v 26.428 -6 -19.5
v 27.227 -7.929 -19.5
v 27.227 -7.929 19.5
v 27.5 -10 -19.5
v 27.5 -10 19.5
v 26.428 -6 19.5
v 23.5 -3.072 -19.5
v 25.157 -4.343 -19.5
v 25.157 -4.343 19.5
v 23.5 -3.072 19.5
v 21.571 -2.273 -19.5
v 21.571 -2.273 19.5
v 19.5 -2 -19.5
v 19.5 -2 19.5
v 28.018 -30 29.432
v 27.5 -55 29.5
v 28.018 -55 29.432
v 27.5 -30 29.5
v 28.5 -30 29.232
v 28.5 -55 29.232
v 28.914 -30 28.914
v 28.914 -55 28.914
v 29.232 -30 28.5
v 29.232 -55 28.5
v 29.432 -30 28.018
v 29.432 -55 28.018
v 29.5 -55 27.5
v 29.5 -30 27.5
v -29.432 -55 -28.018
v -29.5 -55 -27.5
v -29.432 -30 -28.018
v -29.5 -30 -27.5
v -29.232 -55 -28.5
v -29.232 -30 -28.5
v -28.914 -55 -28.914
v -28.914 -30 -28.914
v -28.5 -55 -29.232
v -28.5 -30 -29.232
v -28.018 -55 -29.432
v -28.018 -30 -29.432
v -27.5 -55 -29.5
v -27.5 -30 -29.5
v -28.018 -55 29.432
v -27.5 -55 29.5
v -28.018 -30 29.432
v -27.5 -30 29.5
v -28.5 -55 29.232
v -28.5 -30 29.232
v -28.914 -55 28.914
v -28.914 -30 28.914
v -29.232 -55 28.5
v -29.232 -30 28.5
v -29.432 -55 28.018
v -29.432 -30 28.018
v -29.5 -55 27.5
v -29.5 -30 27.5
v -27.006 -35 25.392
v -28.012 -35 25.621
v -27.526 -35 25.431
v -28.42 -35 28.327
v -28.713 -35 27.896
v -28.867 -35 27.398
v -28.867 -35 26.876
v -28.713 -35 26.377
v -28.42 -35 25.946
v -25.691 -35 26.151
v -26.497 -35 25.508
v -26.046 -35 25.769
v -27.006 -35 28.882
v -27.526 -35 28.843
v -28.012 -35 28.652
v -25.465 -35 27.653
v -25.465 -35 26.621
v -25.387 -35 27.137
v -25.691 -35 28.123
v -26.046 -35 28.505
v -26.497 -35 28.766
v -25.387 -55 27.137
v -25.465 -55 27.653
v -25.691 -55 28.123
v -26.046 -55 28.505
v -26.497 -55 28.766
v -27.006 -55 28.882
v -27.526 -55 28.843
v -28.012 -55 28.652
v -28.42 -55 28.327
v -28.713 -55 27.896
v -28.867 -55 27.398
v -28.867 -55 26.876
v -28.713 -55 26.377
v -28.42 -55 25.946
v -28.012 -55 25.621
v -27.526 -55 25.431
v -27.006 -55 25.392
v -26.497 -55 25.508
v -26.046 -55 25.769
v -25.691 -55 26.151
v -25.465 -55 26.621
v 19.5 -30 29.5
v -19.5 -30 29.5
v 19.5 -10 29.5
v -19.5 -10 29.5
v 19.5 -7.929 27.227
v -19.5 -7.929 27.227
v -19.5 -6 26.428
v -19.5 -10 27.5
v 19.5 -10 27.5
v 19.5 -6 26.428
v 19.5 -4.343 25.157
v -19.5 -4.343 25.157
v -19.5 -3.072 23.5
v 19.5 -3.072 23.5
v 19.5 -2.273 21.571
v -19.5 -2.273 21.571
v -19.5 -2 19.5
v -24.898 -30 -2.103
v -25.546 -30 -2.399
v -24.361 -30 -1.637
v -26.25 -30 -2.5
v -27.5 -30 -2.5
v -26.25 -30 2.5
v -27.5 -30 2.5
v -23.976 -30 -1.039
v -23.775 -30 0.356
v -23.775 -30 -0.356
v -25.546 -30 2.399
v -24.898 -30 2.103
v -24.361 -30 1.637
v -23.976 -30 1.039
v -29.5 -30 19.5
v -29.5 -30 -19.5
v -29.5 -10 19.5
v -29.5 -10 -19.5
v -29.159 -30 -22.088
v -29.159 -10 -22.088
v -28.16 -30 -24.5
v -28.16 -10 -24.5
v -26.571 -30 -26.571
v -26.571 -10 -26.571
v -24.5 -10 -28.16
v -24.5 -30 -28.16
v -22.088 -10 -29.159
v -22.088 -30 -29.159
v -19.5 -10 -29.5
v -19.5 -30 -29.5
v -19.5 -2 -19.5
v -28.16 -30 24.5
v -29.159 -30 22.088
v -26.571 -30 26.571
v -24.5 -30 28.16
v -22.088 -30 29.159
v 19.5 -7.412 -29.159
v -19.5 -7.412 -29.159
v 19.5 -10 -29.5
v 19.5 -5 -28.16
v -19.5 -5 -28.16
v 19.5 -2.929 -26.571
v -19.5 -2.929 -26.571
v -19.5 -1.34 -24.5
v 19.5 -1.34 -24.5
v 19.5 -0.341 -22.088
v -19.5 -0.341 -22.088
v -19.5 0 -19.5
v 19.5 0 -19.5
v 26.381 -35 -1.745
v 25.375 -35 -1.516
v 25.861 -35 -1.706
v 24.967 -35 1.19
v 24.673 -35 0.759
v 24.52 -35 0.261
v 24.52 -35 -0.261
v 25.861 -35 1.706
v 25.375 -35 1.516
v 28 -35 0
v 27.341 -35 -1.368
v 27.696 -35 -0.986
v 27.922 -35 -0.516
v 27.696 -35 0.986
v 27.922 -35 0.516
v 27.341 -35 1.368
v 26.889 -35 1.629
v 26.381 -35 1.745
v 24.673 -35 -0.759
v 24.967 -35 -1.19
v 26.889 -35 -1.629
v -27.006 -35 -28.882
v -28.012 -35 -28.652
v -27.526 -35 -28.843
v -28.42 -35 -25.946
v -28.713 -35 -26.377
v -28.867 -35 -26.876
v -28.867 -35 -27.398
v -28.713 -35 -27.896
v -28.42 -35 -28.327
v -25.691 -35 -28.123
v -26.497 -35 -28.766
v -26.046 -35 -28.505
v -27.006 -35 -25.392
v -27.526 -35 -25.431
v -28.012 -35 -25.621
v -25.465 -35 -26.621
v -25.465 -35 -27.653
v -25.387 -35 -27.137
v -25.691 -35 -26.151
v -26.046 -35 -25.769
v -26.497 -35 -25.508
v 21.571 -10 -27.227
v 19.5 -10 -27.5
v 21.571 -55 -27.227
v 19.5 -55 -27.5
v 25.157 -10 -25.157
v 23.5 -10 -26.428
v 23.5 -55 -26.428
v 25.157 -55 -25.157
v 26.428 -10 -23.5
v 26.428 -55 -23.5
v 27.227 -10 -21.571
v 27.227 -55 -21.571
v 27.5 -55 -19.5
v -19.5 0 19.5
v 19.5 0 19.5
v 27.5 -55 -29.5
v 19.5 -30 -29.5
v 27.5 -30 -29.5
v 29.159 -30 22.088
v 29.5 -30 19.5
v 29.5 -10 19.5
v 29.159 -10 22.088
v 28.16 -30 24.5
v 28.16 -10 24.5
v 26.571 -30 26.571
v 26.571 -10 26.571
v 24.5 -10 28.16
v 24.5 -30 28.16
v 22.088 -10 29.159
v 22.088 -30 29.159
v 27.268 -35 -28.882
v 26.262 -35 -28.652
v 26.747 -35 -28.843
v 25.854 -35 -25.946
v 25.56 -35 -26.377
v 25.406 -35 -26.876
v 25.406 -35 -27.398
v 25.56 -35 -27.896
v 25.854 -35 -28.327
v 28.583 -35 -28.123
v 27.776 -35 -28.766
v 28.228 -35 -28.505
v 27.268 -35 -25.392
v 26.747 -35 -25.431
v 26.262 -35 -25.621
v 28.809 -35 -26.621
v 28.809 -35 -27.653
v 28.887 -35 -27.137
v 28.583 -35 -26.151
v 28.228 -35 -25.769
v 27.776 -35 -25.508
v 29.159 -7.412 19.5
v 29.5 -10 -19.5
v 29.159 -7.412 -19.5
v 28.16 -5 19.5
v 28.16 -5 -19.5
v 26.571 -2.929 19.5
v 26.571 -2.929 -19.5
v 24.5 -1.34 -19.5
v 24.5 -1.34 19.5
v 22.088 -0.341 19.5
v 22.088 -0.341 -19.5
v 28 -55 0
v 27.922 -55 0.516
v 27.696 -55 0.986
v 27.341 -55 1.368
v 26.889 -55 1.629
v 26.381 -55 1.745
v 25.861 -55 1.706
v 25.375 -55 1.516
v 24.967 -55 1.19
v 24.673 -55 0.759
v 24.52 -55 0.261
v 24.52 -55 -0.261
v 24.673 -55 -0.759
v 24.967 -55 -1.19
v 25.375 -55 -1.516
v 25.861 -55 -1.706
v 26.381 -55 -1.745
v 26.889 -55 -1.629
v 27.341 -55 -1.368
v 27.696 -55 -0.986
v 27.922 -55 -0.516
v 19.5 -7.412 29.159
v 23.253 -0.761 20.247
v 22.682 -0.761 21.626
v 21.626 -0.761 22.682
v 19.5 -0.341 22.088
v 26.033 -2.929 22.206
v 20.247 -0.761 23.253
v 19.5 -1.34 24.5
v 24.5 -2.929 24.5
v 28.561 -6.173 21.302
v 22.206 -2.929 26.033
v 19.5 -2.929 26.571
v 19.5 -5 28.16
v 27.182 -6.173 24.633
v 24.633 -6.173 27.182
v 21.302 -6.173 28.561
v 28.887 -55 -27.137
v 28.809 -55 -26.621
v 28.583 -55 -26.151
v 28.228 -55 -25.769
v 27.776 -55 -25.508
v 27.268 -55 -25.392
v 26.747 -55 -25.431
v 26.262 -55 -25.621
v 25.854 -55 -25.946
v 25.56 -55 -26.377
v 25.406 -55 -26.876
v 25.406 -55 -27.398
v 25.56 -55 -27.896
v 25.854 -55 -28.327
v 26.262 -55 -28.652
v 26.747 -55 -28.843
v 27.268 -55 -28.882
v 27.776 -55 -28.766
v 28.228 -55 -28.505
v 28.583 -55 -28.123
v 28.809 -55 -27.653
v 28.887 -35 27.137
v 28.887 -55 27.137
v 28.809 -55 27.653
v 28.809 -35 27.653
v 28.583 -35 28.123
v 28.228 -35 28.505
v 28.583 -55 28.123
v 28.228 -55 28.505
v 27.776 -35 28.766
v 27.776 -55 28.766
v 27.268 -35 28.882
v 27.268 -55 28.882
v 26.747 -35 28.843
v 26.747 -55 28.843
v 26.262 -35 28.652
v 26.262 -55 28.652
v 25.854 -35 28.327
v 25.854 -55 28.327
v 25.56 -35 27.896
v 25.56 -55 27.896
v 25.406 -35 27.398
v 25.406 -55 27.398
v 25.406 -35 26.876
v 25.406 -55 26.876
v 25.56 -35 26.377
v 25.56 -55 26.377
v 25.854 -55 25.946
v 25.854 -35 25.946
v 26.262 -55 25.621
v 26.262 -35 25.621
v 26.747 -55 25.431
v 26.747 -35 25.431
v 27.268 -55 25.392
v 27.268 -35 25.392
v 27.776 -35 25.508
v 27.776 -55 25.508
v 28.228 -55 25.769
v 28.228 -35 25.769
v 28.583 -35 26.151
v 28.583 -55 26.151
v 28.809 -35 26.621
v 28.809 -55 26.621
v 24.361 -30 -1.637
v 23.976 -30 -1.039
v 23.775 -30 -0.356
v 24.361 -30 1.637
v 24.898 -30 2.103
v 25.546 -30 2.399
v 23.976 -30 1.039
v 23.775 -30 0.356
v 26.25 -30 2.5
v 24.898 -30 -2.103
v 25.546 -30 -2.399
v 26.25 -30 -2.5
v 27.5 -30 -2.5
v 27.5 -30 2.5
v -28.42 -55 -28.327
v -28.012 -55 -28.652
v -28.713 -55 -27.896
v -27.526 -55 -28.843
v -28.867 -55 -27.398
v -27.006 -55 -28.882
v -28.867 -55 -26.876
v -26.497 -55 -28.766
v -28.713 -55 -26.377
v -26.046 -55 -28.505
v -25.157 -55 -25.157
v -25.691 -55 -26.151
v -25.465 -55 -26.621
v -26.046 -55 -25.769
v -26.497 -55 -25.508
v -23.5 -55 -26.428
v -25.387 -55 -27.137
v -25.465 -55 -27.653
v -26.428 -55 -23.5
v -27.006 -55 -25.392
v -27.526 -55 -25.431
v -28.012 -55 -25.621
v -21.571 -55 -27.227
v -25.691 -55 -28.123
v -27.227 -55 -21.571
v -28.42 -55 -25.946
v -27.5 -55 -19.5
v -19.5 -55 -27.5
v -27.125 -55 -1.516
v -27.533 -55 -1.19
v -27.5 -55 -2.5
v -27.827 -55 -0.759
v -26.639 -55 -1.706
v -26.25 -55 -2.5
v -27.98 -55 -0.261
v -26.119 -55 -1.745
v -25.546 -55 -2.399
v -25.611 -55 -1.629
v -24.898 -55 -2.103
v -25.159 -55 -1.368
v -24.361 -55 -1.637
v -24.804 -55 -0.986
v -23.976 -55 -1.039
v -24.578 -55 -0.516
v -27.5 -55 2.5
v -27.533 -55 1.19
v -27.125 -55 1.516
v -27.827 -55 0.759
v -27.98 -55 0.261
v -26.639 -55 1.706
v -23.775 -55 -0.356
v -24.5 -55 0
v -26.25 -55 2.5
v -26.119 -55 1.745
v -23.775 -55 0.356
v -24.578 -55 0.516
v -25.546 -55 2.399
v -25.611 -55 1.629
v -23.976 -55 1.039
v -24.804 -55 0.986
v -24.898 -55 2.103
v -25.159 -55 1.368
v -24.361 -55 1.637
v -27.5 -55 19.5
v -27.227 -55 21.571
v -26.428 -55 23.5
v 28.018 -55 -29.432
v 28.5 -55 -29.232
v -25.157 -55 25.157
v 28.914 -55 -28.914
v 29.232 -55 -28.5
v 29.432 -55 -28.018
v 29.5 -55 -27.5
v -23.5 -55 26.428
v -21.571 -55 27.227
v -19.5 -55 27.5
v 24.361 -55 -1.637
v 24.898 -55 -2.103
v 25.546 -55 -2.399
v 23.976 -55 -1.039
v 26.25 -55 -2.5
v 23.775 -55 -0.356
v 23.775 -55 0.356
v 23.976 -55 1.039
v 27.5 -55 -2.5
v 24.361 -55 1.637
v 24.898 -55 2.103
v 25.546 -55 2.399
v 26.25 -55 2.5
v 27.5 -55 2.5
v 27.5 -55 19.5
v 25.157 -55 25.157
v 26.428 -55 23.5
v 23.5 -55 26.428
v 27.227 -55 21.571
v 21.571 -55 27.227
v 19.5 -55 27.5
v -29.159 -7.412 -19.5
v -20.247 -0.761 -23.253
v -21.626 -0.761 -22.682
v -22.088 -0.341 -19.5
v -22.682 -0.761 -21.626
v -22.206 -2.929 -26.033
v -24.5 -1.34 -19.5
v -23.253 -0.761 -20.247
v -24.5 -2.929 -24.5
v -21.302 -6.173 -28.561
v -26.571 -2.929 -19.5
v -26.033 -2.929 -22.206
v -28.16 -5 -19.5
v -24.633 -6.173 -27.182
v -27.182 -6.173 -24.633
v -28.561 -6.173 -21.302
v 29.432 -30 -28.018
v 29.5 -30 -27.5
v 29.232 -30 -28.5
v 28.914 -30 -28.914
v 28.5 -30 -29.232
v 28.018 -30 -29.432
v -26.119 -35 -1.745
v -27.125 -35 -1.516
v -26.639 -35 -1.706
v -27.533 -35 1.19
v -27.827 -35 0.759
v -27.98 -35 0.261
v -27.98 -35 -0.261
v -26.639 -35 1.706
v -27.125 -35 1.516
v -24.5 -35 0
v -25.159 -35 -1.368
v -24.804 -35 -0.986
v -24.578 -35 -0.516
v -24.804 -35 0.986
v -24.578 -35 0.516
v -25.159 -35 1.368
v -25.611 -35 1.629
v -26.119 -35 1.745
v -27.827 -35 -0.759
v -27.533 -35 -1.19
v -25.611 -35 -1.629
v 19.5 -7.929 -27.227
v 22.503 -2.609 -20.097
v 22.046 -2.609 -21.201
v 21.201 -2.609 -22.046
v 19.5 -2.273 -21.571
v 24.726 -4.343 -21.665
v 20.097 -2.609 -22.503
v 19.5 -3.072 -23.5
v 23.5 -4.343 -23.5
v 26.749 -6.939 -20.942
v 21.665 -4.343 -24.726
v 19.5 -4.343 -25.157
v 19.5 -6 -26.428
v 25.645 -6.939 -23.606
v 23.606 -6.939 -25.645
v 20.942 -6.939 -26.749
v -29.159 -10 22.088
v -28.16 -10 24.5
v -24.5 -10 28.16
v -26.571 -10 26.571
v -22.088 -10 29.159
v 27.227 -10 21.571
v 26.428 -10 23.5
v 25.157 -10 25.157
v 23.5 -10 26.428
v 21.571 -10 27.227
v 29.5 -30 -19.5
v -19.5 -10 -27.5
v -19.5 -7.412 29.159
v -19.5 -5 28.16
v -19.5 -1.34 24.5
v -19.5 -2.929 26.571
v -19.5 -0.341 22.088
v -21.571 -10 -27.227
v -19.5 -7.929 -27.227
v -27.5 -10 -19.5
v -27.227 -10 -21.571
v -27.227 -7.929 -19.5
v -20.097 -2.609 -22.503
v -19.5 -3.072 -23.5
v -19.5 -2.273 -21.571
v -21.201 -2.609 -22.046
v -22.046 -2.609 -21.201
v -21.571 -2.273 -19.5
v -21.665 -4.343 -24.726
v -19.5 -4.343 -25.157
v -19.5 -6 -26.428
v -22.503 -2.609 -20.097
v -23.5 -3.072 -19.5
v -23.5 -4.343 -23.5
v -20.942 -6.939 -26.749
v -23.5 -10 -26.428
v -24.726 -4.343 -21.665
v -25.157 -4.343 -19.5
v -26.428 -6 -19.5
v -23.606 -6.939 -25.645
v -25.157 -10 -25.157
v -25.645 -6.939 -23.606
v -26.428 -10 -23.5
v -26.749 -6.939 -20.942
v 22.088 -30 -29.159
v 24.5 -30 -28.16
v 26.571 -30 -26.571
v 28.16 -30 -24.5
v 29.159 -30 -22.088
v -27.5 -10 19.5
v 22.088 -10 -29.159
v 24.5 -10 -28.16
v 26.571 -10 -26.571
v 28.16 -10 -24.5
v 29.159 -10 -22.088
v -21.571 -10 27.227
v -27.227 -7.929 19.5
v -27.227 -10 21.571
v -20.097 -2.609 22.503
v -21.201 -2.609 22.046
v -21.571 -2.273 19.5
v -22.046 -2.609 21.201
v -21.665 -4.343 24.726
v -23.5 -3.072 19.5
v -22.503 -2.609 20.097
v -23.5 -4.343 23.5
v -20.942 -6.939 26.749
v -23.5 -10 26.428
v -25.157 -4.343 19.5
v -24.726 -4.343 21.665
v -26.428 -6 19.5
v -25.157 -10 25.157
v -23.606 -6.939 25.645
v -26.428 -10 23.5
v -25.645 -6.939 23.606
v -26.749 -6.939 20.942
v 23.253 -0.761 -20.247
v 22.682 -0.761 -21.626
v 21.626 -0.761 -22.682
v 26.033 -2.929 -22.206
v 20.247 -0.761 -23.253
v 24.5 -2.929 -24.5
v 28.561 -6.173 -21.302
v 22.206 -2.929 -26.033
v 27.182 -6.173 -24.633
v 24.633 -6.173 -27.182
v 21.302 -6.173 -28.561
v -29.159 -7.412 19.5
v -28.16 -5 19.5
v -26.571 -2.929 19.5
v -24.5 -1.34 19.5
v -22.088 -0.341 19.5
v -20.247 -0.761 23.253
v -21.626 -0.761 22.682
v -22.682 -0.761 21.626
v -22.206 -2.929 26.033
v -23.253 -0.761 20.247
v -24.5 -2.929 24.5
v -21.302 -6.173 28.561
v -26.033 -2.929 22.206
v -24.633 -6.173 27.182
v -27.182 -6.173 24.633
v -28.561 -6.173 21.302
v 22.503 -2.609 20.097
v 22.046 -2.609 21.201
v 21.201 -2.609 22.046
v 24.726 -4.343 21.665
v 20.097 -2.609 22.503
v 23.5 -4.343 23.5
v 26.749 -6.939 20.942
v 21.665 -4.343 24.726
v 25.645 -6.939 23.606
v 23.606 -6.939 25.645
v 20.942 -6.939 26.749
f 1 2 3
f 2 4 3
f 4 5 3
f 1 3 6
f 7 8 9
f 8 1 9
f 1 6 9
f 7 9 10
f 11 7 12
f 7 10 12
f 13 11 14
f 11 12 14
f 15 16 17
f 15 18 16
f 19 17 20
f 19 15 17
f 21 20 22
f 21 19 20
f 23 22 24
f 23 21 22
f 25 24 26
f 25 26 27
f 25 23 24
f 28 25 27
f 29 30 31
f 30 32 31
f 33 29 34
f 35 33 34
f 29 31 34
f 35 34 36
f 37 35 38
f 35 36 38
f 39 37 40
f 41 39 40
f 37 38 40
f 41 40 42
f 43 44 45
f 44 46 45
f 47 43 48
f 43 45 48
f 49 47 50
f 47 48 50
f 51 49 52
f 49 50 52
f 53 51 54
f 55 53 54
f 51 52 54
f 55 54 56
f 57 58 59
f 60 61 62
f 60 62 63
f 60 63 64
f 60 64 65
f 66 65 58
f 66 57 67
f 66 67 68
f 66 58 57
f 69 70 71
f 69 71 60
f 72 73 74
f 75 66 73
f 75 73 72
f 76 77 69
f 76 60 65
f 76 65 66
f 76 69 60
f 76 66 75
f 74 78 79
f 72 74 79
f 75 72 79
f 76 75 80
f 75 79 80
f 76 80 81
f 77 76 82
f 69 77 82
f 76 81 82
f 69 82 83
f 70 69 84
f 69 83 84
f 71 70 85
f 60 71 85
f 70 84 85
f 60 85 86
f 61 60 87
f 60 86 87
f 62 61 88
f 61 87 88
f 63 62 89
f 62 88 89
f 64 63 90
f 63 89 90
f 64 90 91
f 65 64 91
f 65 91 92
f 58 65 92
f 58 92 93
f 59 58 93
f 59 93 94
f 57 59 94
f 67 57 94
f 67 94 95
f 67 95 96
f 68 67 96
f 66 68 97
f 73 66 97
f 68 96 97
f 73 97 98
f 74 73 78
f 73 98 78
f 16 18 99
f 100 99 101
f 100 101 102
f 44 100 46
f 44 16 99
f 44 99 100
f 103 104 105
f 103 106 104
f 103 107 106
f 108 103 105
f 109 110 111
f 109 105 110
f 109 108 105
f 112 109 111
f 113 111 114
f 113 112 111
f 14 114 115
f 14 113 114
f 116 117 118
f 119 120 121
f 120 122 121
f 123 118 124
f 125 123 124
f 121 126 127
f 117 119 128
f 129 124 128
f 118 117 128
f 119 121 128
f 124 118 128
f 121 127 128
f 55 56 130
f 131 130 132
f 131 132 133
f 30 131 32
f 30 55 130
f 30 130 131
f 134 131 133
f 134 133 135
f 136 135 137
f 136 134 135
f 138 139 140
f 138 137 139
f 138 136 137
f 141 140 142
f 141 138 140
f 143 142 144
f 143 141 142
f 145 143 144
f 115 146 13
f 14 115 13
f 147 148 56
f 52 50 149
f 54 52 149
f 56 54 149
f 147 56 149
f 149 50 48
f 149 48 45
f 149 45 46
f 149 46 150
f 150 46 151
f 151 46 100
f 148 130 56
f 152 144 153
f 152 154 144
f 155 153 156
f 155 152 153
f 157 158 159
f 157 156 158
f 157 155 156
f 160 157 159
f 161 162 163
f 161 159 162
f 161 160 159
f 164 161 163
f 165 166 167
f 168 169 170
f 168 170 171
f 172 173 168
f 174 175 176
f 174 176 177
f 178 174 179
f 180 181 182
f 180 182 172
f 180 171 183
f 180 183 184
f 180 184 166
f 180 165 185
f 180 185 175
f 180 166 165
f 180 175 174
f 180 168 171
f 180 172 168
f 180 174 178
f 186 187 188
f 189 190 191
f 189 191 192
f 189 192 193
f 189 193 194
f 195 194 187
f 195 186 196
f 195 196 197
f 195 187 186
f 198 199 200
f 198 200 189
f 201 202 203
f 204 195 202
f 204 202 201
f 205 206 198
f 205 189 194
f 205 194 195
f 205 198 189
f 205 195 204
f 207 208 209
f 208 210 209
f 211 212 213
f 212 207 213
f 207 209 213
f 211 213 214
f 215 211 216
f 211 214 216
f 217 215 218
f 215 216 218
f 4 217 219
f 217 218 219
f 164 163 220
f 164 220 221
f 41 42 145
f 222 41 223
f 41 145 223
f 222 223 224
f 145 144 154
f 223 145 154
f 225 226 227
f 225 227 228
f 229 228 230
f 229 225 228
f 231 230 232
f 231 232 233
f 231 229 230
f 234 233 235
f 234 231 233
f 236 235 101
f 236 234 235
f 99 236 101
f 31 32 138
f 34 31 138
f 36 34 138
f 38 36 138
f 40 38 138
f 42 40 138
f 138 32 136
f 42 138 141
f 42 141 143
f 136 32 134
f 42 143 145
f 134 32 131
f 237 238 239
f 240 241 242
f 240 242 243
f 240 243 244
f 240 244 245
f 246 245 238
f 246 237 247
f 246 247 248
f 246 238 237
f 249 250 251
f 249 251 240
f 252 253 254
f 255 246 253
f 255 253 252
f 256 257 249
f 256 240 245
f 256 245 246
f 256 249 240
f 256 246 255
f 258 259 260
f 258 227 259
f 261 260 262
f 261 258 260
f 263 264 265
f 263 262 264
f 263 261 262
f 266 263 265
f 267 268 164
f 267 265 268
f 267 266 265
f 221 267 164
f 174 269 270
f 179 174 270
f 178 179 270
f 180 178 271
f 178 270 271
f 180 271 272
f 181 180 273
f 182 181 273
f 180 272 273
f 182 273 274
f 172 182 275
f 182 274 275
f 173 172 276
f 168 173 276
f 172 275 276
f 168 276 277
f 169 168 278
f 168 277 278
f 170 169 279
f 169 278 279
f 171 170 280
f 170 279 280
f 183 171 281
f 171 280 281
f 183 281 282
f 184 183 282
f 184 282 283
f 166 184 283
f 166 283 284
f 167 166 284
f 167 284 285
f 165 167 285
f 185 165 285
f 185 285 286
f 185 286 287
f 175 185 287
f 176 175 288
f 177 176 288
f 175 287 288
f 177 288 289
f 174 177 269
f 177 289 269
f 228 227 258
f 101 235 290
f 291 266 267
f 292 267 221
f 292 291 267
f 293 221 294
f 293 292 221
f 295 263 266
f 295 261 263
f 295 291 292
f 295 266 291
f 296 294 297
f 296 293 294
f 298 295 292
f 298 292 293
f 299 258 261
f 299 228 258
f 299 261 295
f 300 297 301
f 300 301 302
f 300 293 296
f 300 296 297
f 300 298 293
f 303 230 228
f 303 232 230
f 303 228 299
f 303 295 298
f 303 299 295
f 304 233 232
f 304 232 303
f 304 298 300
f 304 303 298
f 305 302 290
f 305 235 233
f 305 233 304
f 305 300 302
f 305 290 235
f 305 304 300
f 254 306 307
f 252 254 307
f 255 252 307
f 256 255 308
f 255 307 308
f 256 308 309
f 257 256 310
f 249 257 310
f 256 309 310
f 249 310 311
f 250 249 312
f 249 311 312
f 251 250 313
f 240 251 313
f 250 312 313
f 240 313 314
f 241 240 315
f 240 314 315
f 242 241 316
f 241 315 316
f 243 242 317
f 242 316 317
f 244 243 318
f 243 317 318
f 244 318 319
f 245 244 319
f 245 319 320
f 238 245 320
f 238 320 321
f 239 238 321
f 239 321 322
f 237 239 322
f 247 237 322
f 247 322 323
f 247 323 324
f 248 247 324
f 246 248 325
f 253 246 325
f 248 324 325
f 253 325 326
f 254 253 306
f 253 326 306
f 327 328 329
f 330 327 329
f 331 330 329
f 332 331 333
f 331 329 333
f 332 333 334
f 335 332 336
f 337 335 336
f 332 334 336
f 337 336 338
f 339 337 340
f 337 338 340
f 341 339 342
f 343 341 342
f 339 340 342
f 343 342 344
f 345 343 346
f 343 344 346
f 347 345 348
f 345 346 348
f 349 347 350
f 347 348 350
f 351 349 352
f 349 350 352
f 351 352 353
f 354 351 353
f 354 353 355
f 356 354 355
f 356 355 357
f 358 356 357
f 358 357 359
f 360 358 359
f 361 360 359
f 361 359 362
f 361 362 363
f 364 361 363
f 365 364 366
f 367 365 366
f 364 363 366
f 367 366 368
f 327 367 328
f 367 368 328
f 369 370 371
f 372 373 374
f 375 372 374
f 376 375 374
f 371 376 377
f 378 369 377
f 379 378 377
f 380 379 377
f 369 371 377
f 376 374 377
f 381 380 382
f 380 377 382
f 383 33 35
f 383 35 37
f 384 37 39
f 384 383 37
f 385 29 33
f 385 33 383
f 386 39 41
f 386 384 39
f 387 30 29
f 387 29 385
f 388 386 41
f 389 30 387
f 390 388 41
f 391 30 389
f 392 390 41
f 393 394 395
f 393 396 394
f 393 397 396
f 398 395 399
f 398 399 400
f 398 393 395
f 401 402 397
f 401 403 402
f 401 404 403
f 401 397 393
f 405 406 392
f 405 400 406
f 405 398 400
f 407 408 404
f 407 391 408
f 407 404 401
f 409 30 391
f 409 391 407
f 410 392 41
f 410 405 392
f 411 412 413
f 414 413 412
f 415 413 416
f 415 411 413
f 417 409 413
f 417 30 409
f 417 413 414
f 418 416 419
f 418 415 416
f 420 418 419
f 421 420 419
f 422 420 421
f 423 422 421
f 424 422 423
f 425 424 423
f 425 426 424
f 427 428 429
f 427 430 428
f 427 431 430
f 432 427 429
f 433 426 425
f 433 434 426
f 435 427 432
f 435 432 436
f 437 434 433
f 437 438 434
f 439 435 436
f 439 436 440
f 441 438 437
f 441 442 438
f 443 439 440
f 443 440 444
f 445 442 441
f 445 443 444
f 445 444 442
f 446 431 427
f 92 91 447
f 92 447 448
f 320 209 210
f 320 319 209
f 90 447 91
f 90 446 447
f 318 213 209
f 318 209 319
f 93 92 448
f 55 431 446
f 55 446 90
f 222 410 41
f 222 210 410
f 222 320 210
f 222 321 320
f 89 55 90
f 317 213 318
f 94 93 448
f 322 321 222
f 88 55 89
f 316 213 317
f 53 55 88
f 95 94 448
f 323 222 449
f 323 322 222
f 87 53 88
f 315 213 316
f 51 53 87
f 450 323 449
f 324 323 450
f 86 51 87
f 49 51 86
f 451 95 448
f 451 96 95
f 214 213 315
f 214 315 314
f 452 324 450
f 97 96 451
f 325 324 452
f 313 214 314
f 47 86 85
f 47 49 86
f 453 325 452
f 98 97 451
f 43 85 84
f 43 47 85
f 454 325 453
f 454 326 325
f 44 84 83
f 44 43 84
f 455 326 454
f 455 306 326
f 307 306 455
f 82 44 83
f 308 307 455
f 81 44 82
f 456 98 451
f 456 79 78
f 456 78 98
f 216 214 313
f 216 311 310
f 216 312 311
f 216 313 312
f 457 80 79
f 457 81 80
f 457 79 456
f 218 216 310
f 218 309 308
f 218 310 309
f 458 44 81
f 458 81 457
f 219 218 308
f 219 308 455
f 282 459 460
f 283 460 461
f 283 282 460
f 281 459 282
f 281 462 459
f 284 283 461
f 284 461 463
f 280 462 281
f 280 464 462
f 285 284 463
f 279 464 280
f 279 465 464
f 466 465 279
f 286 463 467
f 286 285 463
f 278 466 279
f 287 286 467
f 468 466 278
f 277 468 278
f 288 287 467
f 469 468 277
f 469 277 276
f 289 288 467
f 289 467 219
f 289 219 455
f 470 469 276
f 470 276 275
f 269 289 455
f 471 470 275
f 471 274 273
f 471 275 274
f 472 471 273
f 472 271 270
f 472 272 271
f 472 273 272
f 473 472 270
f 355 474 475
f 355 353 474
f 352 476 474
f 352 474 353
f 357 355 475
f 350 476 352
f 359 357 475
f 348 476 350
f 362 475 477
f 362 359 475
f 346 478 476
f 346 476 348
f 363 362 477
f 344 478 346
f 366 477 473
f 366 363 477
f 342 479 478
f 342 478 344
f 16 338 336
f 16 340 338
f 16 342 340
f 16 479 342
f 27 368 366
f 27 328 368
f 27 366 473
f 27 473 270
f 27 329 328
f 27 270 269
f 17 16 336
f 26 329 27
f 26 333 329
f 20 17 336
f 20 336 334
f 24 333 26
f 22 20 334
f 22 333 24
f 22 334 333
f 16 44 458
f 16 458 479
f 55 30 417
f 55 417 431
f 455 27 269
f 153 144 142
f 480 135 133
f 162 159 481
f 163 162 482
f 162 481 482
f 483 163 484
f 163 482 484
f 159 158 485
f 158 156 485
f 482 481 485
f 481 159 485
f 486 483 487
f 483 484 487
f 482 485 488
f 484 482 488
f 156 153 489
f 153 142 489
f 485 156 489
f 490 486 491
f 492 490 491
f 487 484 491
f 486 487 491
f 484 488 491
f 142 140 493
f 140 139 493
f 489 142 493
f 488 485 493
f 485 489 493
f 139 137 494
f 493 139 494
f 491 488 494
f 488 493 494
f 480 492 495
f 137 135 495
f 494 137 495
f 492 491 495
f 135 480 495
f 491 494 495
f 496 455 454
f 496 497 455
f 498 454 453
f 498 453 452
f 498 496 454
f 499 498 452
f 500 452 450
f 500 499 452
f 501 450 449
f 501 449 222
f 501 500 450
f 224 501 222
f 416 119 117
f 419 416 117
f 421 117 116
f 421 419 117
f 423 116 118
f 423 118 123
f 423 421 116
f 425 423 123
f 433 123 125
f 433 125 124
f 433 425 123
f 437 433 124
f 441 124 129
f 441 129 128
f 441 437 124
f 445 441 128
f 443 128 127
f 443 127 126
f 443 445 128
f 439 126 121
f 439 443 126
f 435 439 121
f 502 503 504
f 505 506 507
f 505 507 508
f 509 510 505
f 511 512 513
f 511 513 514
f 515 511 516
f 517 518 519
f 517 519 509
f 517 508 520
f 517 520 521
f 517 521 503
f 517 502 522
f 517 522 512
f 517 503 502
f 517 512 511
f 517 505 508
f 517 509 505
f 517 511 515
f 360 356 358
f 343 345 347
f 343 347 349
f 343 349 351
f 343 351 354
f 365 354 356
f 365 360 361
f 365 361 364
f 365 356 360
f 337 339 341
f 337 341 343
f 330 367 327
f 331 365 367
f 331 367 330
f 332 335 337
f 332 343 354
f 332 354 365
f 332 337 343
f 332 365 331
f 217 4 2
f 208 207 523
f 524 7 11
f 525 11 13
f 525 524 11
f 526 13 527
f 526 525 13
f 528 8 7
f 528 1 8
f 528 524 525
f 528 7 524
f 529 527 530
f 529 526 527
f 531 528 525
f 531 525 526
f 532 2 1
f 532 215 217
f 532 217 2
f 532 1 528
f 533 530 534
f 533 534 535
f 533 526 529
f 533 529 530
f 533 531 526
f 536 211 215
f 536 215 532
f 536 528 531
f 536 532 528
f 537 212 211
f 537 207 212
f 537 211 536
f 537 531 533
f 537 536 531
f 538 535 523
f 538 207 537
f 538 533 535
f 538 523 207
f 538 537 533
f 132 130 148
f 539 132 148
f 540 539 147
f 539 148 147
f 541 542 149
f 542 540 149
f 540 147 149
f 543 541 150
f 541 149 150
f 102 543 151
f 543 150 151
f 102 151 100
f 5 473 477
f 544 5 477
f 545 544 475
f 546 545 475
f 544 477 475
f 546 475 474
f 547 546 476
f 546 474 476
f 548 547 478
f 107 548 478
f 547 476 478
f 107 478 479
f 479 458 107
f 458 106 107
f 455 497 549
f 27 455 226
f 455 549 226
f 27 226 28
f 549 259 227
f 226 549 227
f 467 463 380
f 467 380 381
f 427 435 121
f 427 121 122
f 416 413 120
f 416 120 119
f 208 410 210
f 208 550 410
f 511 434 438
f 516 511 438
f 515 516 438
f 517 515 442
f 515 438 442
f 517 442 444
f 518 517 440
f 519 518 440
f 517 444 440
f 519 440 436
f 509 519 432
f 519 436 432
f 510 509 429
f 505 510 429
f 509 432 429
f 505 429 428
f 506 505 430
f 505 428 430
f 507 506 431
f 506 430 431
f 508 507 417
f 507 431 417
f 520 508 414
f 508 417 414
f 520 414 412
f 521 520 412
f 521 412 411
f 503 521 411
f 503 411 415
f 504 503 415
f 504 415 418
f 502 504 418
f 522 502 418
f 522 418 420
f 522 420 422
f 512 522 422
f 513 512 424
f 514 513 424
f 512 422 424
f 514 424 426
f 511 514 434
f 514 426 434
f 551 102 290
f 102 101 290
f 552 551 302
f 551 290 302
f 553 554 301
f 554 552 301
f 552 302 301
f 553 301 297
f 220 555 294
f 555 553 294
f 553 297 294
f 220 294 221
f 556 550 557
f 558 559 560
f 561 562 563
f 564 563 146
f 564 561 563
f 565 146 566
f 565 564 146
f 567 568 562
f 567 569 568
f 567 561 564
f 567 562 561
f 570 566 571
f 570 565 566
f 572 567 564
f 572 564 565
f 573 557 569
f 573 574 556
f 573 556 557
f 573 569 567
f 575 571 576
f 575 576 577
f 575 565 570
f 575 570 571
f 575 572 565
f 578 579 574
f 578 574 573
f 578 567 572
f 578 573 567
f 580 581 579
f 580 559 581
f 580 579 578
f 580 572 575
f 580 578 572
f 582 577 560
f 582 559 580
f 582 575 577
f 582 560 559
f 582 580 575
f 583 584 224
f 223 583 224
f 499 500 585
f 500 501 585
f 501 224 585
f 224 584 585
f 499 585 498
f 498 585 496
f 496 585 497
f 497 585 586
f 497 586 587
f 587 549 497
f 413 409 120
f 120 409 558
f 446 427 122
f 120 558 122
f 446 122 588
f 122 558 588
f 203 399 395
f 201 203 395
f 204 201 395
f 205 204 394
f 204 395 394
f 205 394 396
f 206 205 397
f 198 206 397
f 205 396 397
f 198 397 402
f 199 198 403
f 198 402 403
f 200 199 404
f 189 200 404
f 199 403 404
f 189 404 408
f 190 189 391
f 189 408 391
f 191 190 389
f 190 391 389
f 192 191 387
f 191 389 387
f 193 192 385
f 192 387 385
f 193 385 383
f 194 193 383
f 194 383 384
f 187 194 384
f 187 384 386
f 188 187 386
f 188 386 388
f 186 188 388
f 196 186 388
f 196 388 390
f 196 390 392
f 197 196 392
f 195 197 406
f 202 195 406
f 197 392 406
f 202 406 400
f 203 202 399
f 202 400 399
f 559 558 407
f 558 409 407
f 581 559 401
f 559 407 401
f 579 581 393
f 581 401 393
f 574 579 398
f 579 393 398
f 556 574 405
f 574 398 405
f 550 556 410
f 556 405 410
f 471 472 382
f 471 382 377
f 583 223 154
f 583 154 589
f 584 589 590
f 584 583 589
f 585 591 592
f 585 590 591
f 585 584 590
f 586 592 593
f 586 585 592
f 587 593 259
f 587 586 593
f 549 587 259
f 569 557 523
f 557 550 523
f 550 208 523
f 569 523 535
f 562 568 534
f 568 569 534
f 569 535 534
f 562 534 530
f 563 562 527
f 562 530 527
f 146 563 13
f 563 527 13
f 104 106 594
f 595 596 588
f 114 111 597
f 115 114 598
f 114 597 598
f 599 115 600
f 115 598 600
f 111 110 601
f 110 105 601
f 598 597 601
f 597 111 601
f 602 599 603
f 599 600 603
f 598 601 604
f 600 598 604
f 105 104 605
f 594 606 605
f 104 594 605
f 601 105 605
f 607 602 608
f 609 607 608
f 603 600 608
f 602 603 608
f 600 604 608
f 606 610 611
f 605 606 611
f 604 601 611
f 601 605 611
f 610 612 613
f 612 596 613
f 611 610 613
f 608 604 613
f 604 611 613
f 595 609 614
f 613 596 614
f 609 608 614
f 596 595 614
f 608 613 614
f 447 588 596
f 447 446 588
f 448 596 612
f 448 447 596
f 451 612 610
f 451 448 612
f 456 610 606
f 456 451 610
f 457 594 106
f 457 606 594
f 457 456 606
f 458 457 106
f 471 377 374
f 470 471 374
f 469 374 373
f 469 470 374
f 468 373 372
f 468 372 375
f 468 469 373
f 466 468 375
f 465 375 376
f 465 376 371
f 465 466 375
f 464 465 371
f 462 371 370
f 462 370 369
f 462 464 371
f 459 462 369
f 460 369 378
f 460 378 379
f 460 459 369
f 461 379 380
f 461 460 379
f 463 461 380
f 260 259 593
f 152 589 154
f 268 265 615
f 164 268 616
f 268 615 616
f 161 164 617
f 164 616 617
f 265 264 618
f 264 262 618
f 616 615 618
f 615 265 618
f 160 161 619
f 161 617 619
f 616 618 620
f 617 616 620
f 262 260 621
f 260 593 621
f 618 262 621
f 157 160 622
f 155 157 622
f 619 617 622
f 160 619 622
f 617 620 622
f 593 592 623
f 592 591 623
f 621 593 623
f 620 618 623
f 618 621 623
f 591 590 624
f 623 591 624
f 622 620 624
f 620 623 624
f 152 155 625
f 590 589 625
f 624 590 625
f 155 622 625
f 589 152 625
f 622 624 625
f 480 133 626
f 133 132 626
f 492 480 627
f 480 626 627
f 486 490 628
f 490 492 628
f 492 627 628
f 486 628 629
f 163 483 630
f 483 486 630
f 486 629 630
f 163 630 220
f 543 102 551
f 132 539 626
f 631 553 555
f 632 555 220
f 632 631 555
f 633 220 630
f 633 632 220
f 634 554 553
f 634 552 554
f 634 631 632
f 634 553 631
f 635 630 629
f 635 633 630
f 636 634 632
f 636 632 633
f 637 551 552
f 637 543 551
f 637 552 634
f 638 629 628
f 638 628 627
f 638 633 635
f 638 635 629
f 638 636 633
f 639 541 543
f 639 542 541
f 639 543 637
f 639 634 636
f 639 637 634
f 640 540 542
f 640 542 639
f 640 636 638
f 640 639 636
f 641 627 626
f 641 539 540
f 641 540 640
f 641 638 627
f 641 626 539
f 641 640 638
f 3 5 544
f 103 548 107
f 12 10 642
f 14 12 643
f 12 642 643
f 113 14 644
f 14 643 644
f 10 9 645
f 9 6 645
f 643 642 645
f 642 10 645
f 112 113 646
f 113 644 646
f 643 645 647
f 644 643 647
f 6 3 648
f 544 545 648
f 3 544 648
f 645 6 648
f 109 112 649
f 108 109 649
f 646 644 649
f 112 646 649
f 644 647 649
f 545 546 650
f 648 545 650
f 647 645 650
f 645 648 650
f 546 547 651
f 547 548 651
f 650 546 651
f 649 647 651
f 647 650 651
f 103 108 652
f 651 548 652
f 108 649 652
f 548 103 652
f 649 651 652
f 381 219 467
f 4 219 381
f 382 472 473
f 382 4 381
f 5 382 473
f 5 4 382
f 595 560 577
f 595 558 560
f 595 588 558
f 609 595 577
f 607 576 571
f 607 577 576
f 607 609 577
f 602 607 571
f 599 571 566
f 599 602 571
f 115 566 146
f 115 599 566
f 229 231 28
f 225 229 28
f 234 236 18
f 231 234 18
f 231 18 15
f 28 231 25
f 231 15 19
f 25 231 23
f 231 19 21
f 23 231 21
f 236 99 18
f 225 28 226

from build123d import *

# Parameters (mm, degrees)
F0_W     = 59
F0_H     = 59
F1_DEPTH = 55
F2_R     = 10
F3_T     = -2
F5_DEPTH = 25
F6_R     = 1.75
F7_DEPTH = 20
F8_R     = 2


with BuildPart() as f1:
    # F0 (on Front) → F1 (new body)
    with BuildSketch(Plane.XZ):
        Rectangle(F0_W, F0_H)
    extrude(amount=F1_DEPTH)

    # F2
    f2_edges = [f1.edges().sort_by_distance(p)[0] for p in [
        (-29.5, -27.5, 29.5),
        (29.5, -27.5, 29.5),
        (29.5, -27.5, -29.5),
        (-29.5, -27.5, -29.5),
        (29.5, 0, 0),
        (0, 0, 29.5),
        (0, 0, -29.5),
        (-29.5, 0, 0),
    ]]
    fillet(f2_edges, radius=F2_R)

    # F3
    f3_openings = [f1.faces().sort_by_distance(p)[0] for p in [
        (0, -55, 0),
    ]]
    offset(amount=F3_T, openings=f3_openings)

    # F4 (on face) → F5 (join)
    with BuildSketch(Plane.XZ.offset(55)):
        with BuildLine():
            ThreePointArc((-29.5, 19.5), (-26.571068, 26.571068), (-19.5, 29.5))
            Line((-19.5, 29.5), (-29.5, 29.5))
            Line((-29.5, 29.5), (-29.5, 19.5))
        make_face()
        with BuildLine():
            Line((29.5, 29.5), (19.5, 29.5))
            ThreePointArc((19.5, 29.5), (26.571068, 26.571068), (29.5, 19.5))
            Line((29.5, 19.5), (29.5, 29.5))
        make_face()
        with BuildLine():
            Line((-29.5, -19.5), (-29.5, -29.5))
            Line((-29.5, -29.5), (-19.5, -29.5))
            ThreePointArc((-19.5, -29.5), (-26.571068, -26.571068), (-29.5, -19.5))
        make_face()
        with BuildLine():
            ThreePointArc((29.5, -19.5), (26.571068, -26.571068), (19.5, -29.5))
            Line((19.5, -29.5), (29.5, -29.5))
            Line((29.5, -29.5), (29.5, -19.5))
        make_face()
        with BuildLine():
            Line((-27.5, -2.5), (-26.25, -2.5))
            ThreePointArc((-26.25, -2.5), (-23.75, 0), (-26.25, 2.5))
            Line((-26.25, 2.5), (-27.5, 2.5))
            Line((-27.5, 2.5), (-27.5, -2.5))
        make_face()
        with BuildLine():
            ThreePointArc((26.25, 2.5), (23.75, 0), (26.25, -2.5))
            Line((26.25, -2.5), (27.5, -2.5))
            Line((27.5, -2.5), (27.5, 2.5))
            Line((27.5, 2.5), (26.25, 2.5))
        make_face()
    extrude(amount=-F5_DEPTH)

    # F6 (on face) → F7 (cut)
    with BuildSketch(Plane.XZ.offset(55)):
        with Locations((27.136753, 27.136753)):
            Circle(F6_R)
        with Locations((27.136753, -27.136753)):
            Circle(F6_R)
        with Locations((-27.136753, -27.136753)):
            Circle(F6_R)
        with Locations((-27.136753, 27.136753)):
            Circle(F6_R)
        with Locations((-26.25, 0)):
            Circle(F6_R)
        with Locations((26.25, 0)):
            Circle(F6_R)
    extrude(amount=-F7_DEPTH, mode=Mode.SUBTRACT)

    # F8
    f8_edges = [f1.edges().sort_by_distance(p)[0] for p in [
        (29.5, -42.5, 29.5),
        (29.5, -42.5, -29.5),
        (-29.5, -42.5, 29.5),
        (-29.5, -42.5, -29.5),
    ]]
    fillet(f8_edges, radius=F8_R)


solid = f1.part
